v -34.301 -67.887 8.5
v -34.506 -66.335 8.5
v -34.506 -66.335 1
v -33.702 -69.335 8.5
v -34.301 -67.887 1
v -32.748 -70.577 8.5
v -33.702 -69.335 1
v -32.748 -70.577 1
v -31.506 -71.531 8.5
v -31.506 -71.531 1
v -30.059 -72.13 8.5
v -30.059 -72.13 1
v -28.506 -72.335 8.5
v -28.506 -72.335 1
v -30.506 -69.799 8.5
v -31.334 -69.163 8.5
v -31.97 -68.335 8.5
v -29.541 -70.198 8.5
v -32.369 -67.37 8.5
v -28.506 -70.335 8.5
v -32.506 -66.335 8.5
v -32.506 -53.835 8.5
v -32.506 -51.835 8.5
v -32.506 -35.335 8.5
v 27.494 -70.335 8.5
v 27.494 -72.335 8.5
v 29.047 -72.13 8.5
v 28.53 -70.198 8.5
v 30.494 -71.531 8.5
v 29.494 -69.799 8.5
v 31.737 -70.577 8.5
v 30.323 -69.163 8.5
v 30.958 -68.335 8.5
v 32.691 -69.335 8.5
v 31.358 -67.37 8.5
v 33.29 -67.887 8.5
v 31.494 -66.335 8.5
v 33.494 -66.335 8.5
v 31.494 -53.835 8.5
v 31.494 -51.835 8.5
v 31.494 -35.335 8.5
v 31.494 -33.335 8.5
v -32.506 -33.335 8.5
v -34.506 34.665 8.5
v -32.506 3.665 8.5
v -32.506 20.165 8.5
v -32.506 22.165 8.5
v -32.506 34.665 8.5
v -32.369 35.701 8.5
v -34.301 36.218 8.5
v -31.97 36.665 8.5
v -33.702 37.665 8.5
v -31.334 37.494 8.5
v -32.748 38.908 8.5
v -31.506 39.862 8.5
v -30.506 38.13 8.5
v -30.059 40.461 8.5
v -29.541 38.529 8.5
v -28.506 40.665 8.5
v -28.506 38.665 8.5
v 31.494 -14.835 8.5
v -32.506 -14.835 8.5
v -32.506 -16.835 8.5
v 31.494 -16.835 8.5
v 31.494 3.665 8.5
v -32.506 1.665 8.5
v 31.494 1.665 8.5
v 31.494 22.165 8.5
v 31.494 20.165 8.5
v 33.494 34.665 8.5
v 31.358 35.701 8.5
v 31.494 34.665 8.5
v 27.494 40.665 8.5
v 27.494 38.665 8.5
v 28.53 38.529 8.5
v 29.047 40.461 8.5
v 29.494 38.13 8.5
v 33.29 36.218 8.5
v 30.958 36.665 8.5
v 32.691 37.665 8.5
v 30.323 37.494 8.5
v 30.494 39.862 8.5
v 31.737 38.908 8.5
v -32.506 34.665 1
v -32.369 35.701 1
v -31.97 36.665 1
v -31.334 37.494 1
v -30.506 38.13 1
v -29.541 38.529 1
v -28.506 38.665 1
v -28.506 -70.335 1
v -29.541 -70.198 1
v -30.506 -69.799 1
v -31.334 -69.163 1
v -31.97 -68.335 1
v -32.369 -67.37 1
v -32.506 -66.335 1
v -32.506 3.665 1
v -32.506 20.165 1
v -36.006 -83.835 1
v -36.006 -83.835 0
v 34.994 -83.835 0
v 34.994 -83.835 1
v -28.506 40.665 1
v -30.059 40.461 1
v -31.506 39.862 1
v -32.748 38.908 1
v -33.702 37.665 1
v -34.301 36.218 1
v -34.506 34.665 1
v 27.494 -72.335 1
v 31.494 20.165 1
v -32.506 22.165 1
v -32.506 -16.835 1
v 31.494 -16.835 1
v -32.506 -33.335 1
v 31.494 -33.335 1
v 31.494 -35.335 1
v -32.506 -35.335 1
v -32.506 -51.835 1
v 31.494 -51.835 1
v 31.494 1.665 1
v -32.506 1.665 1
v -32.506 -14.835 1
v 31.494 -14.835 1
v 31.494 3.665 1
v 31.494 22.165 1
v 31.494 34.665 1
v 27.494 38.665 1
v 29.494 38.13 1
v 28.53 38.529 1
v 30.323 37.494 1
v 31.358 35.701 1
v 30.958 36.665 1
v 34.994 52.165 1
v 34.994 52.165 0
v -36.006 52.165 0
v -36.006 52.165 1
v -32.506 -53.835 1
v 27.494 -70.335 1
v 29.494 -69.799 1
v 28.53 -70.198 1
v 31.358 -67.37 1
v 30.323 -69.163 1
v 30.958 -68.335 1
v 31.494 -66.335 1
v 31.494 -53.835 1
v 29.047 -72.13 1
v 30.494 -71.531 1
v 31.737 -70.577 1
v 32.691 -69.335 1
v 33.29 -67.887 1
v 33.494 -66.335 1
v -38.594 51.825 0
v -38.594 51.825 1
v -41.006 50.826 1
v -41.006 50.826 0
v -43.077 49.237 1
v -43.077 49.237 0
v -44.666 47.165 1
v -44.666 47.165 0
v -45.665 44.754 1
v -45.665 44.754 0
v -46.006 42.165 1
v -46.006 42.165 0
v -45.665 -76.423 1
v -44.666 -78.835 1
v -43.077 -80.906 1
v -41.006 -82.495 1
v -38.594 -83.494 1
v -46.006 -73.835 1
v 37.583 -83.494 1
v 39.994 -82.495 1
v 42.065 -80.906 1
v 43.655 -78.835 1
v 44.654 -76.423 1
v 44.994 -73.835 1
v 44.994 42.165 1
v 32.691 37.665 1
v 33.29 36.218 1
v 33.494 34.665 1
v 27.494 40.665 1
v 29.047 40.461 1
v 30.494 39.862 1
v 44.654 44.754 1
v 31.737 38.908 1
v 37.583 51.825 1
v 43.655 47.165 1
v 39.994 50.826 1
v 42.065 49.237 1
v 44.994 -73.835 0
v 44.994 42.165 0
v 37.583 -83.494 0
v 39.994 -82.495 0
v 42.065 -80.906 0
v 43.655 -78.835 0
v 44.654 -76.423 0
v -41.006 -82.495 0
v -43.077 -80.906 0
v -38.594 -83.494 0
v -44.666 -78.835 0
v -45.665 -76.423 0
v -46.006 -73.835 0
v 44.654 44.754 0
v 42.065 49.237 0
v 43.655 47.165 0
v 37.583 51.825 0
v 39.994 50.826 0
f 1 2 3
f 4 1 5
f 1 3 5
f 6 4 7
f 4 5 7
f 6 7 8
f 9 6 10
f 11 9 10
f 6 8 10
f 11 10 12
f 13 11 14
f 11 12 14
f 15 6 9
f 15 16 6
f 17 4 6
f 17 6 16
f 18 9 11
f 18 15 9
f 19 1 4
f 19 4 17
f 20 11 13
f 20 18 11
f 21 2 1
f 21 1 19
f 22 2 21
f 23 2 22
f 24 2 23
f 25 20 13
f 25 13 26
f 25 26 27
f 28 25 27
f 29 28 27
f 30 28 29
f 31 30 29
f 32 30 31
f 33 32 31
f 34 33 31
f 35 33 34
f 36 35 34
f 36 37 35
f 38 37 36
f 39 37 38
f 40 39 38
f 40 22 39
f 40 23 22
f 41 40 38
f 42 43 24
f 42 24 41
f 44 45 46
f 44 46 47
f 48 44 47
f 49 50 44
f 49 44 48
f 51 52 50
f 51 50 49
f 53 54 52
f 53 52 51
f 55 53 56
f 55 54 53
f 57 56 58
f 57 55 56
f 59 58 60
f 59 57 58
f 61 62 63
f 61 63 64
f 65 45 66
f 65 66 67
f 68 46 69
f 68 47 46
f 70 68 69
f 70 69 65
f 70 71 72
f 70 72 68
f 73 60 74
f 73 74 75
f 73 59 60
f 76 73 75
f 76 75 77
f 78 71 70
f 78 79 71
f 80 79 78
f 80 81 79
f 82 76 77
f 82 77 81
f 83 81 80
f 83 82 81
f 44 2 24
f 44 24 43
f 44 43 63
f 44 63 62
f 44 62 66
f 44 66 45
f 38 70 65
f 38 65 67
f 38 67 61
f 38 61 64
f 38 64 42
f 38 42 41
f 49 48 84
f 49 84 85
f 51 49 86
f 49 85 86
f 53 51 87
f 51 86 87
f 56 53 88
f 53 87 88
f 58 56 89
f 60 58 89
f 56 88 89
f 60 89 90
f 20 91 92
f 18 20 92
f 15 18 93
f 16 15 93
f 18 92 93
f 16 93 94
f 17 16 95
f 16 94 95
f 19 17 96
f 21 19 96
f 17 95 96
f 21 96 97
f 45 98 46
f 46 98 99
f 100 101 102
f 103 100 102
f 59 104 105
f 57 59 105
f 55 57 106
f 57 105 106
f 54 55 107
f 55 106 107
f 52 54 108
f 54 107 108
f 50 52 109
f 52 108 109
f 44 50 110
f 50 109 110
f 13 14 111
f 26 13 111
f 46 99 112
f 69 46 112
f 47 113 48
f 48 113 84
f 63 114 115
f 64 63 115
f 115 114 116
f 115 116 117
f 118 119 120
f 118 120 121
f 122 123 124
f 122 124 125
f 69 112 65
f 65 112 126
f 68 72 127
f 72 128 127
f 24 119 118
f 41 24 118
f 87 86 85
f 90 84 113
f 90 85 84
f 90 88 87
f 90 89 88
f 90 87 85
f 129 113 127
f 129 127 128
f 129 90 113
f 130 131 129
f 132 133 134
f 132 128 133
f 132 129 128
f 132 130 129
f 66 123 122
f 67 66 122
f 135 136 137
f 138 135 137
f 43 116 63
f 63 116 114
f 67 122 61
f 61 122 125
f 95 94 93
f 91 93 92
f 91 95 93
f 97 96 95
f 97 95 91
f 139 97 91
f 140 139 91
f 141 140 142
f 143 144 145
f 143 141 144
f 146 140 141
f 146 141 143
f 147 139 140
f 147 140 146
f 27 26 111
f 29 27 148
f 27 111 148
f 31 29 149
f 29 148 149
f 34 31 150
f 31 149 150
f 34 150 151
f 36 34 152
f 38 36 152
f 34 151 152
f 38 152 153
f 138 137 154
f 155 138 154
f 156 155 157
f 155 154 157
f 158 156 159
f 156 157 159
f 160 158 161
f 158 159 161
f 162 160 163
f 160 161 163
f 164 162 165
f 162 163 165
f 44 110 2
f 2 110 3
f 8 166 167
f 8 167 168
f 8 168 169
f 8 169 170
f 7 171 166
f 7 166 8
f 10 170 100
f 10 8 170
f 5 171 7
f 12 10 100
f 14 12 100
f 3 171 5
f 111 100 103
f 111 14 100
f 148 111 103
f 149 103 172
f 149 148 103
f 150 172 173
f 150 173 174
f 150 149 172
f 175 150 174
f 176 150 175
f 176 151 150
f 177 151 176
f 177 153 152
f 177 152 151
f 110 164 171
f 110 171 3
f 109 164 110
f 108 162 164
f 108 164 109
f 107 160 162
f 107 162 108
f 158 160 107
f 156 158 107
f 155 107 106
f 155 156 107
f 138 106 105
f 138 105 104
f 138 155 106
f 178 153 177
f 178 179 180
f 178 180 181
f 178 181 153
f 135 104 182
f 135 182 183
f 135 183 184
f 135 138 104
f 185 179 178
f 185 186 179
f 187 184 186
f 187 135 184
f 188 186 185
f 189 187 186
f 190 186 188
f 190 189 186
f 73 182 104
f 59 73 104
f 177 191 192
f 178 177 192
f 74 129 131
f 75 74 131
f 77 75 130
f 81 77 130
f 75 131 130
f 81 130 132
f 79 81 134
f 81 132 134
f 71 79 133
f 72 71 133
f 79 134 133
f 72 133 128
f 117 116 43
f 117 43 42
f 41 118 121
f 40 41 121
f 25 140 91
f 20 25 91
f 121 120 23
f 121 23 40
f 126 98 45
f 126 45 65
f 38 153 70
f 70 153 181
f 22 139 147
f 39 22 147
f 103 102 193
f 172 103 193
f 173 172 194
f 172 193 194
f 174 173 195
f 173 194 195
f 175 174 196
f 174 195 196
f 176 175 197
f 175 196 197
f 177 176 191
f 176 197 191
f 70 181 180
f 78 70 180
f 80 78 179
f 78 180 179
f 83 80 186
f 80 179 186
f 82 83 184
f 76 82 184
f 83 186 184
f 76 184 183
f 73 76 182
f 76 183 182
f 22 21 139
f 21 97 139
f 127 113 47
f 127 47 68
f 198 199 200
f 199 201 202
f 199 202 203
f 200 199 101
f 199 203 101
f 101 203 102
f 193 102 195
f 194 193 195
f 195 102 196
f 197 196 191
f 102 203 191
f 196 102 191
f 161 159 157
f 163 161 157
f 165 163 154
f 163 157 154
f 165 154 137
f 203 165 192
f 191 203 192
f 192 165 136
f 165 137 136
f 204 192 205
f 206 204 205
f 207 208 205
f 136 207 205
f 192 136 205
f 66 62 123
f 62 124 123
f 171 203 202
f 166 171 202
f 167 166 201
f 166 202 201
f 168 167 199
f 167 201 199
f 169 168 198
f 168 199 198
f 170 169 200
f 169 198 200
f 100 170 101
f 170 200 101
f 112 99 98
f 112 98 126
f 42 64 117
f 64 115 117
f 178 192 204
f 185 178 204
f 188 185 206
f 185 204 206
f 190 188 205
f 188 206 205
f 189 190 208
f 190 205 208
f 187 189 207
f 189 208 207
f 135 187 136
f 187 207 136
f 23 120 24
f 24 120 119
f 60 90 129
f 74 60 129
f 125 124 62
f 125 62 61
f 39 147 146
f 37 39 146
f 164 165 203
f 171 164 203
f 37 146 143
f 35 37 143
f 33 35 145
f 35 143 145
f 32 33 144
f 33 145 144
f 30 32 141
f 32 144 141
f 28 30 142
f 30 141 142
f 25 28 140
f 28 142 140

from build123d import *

# Parameters (mm, degrees)
F0_W     = 64
F0_H     = 16.5
F1_DEPTH = 1
F2_DEPTH = 8.5
F0_H_2   = 2
F3_DEPTH = 8.5


with BuildPart() as f1:
    # F0 (on Top) → F1 (new body)
    with BuildSketch(Plane.XY):
        with BuildLine():
            Line((34.994369, 52.165454), (-36.005631, 52.165454))
            ThreePointArc((-36.005631, 52.165454), (-43.076699, 49.236522), (-46.005631, 42.165454))
            Line((-46.005631, 42.165454), (-46.005631, -73.834546))
            ThreePointArc((-46.005631, -73.834546), (-43.076699, -80.905614), (-36.005631, -83.834546))
            Line((-36.005631, -83.834546), (34.994369, -83.834546))
            ThreePointArc((34.994369, -83.834546), (42.065437, -80.905614), (44.994369, -73.834546))
            Line((44.994369, -73.834546), (44.994369, 42.165454))
            ThreePointArc((44.994369, 42.165454), (42.065437, 49.236522), (34.994369, 52.165454))
        make_face()
        with BuildLine():
            ThreePointArc((-38.505631, 34.665454), (-35.576699, 41.736522), (-28.505631, 44.665454))
            Line((-28.505631, 44.665454), (27.494369, 44.665454))
            ThreePointArc((27.494369, 44.665454), (34.565437, 41.736522), (37.494369, 34.665454))
            Line((37.494369, 34.665454), (37.494369, -66.334546))
            ThreePointArc((37.494369, -66.334546), (34.565437, -73.405614), (27.494369, -76.334546))
            Line((27.494369, -76.334546), (-28.505631, -76.334546))
            ThreePointArc((-28.505631, -76.334546), (-35.576699, -73.405614), (-38.505631, -66.334546))
            Line((-38.505631, -66.334546), (-38.505631, 34.665454))
        make_face(mode=Mode.SUBTRACT)
        with BuildLine():
            Line((27.494369, 44.665454), (-28.505631, 44.665454))
            ThreePointArc((-28.505631, 44.665454), (-35.576699, 41.736522), (-38.505631, 34.665454))
            Line((-38.505631, 34.665454), (-38.505631, -66.334546))
            ThreePointArc((-38.505631, -66.334546), (-35.576699, -73.405614), (-28.505631, -76.334546))
            Line((-28.505631, -76.334546), (27.494369, -76.334546))
            ThreePointArc((27.494369, -76.334546), (34.565437, -73.405614), (37.494369, -66.334546))
            Line((37.494369, -66.334546), (37.494369, 34.665454))
            ThreePointArc((37.494369, 34.665454), (34.565437, 41.736522), (27.494369, 44.665454))
        make_face()
        with BuildLine():
            ThreePointArc((-36.505631, 34.665454), (-34.162485, 40.322309), (-28.505631, 42.665454))
            Line((-28.505631, 42.665454), (27.494369, 42.665454))
            ThreePointArc((27.494369, 42.665454), (33.151223, 40.322309), (35.494369, 34.665454))
            Line((35.494369, 34.665454), (35.494369, -66.334546))
            ThreePointArc((35.494369, -66.334546), (33.151223, -71.9914), (27.494369, -74.334546))
            Line((27.494369, -74.334546), (-28.505631, -74.334546))
            ThreePointArc((-28.505631, -74.334546), (-34.162485, -71.9914), (-36.505631, -66.334546))
            Line((-36.505631, -66.334546), (-36.505631, 34.665454))
        make_face(mode=Mode.SUBTRACT)
        with BuildLine():
            Line((27.494369, 42.665454), (-28.505631, 42.665454))
            ThreePointArc((-28.505631, 42.665454), (-34.162485, 40.322309), (-36.505631, 34.665454))
            Line((-36.505631, 34.665454), (-36.505631, -66.334546))
            ThreePointArc((-36.505631, -66.334546), (-34.162485, -71.9914), (-28.505631, -74.334546))
            Line((-28.505631, -74.334546), (27.494369, -74.334546))
            ThreePointArc((27.494369, -74.334546), (33.151223, -71.9914), (35.494369, -66.334546))
            Line((35.494369, -66.334546), (35.494369, 34.665454))
            ThreePointArc((35.494369, 34.665454), (33.151223, 40.322309), (27.494369, 42.665454))
        make_face()
        with BuildLine():
            ThreePointArc((-34.505631, 34.665454), (-32.748272, 38.908095), (-28.505631, 40.665454))
            Line((-28.505631, 40.665454), (27.494369, 40.665454))
            ThreePointArc((27.494369, 40.665454), (31.73701, 38.908095), (33.494369, 34.665454))
            Line((33.494369, 34.665454), (33.494369, -66.334546))
            ThreePointArc((33.494369, -66.334546), (31.73701, -70.577186), (27.494369, -72.334546))
            Line((27.494369, -72.334546), (-28.505631, -72.334546))
            ThreePointArc((-28.505631, -72.334546), (-32.748272, -70.577186), (-34.505631, -66.334546))
            Line((-34.505631, -66.334546), (-34.505631, 34.665454))
        make_face(mode=Mode.SUBTRACT)
        with BuildLine():
            Line((27.494369, 40.665454), (-28.505631, 40.665454))
            ThreePointArc((-28.505631, 40.665454), (-32.748272, 38.908095), (-34.505631, 34.665454))
            Line((-34.505631, 34.665454), (-34.505631, -66.334546))
            ThreePointArc((-34.505631, -66.334546), (-32.748272, -70.577186), (-28.505631, -72.334546))
            Line((-28.505631, -72.334546), (27.494369, -72.334546))
            ThreePointArc((27.494369, -72.334546), (31.73701, -70.577186), (33.494369, -66.334546))
            Line((33.494369, -66.334546), (33.494369, 34.665454))
            ThreePointArc((33.494369, 34.665454), (31.73701, 38.908095), (27.494369, 40.665454))
        make_face()
        with BuildLine():
            ThreePointArc((-32.505631, 34.665454), (-31.334058, 37.493881), (-28.505631, 38.665454))
            Line((-28.505631, 38.665454), (27.494369, 38.665454))
            ThreePointArc((27.494369, 38.665454), (30.322796, 37.493881), (31.494369, 34.665454))
            Line((31.494369, 34.665454), (31.494369, 22.165454))
            Line((31.494369, 22.165454), (31.494369, 20.165454))
            Line((31.494369, 20.165454), (31.494369, 3.665454))
            Line((31.494369, 3.665454), (31.494369, 1.665454))
            Line((31.494369, 1.665454), (31.494369, -14.834546))
            Line((31.494369, -14.834546), (31.494369, -16.834546))
            Line((31.494369, -16.834546), (31.494369, -33.334546))
            Line((31.494369, -33.334546), (31.494369, -35.334546))
            Line((31.494369, -35.334546), (31.494369, -51.834546))
            Line((31.494369, -51.834546), (31.494369, -53.834546))
            Line((31.494369, -53.834546), (31.494369, -66.334546))
            ThreePointArc((31.494369, -66.334546), (30.322796, -69.162973), (27.494369, -70.334546))
            Line((27.494369, -70.334546), (-28.505631, -70.334546))
            ThreePointArc((-28.505631, -70.334546), (-31.334058, -69.162973), (-32.505631, -66.334546))
            Line((-32.505631, -66.334546), (-32.505631, -53.834546))
            Line((-32.505631, -53.834546), (-32.505631, -51.834546))
            Line((-32.505631, -51.834546), (-32.505631, -35.334546))
            Line((-32.505631, -35.334546), (-32.505631, -33.334546))
            Line((-32.505631, -33.334546), (-32.505631, -16.834546))
            Line((-32.505631, -16.834546), (-32.505631, -14.834546))
            Line((-32.505631, -14.834546), (-32.505631, 1.665454))
            Line((-32.505631, 1.665454), (-32.505631, 3.665454))
            Line((-32.505631, 3.665454), (-32.505631, 20.165454))
            Line((-32.505631, 20.165454), (-32.505631, 22.165454))
            Line((-32.505631, 22.165454), (-32.505631, 34.665454))
        make_face(mode=Mode.SUBTRACT)
        with BuildLine():
            Line((27.494369, 38.665454), (-28.505631, 38.665454))
            ThreePointArc((-28.505631, 38.665454), (-31.334058, 37.493881), (-32.505631, 34.665454))
            Line((-32.505631, 34.665454), (-32.505631, 22.165454))
            Line((-32.505631, 22.165454), (31.494369, 22.165454))
            Line((31.494369, 22.165454), (31.494369, 34.665454))
            ThreePointArc((31.494369, 34.665454), (30.322796, 37.493881), (27.494369, 38.665454))
        make_face()
        with Locations((-0.505631, 11.915454)):
            Rectangle(F0_W, F0_H)
        with Locations((-0.505631, -6.584546)):
            Rectangle(F0_W, F0_H)
        with Locations((-0.505631, -25.084546)):
            Rectangle(F0_W, F0_H)
        with Locations((-0.505631, -43.584546)):
            Rectangle(F0_W, F0_H)
        with BuildLine():
            Line((31.494369, -53.834546), (-32.505631, -53.834546))
            Line((-32.505631, -53.834546), (-32.505631, -66.334546))
            ThreePointArc((-32.505631, -66.334546), (-31.334058, -69.162973), (-28.505631, -70.334546))
            Line((-28.505631, -70.334546), (27.494369, -70.334546))
            ThreePointArc((27.494369, -70.334546), (30.322796, -69.162973), (31.494369, -66.334546))
            Line((31.494369, -66.334546), (31.494369, -53.834546))
        make_face()
    extrude(amount=F1_DEPTH)



with BuildPart() as f2:
    # F0 (on Top) → F2 (new body)
    with BuildSketch(Plane.XY):
        with BuildLine():
            Line((27.494369, 40.665454), (-28.505631, 40.665454))
            ThreePointArc((-28.505631, 40.665454), (-32.748272, 38.908095), (-34.505631, 34.665454))
            Line((-34.505631, 34.665454), (-34.505631, -66.334546))
            ThreePointArc((-34.505631, -66.334546), (-32.748272, -70.577186), (-28.505631, -72.334546))
            Line((-28.505631, -72.334546), (27.494369, -72.334546))
            ThreePointArc((27.494369, -72.334546), (31.73701, -70.577186), (33.494369, -66.334546))
            Line((33.494369, -66.334546), (33.494369, 34.665454))
            ThreePointArc((33.494369, 34.665454), (31.73701, 38.908095), (27.494369, 40.665454))
        make_face()
        with BuildLine():
            ThreePointArc((-32.505631, 34.665454), (-31.334058, 37.493881), (-28.505631, 38.665454))
            Line((-28.505631, 38.665454), (27.494369, 38.665454))
            ThreePointArc((27.494369, 38.665454), (30.322796, 37.493881), (31.494369, 34.665454))
            Line((31.494369, 34.665454), (31.494369, 22.165454))
            Line((31.494369, 22.165454), (31.494369, 20.165454))
            Line((31.494369, 20.165454), (31.494369, 3.665454))
            Line((31.494369, 3.665454), (31.494369, 1.665454))
            Line((31.494369, 1.665454), (31.494369, -14.834546))
            Line((31.494369, -14.834546), (31.494369, -16.834546))
            Line((31.494369, -16.834546), (31.494369, -33.334546))
            Line((31.494369, -33.334546), (31.494369, -35.334546))
            Line((31.494369, -35.334546), (31.494369, -51.834546))
            Line((31.494369, -51.834546), (31.494369, -53.834546))
            Line((31.494369, -53.834546), (31.494369, -66.334546))
            ThreePointArc((31.494369, -66.334546), (30.322796, -69.162973), (27.494369, -70.334546))
            Line((27.494369, -70.334546), (-28.505631, -70.334546))
            ThreePointArc((-28.505631, -70.334546), (-31.334058, -69.162973), (-32.505631, -66.334546))
            Line((-32.505631, -66.334546), (-32.505631, -53.834546))
            Line((-32.505631, -53.834546), (-32.505631, -51.834546))
            Line((-32.505631, -51.834546), (-32.505631, -35.334546))
            Line((-32.505631, -35.334546), (-32.505631, -33.334546))
            Line((-32.505631, -33.334546), (-32.505631, -16.834546))
            Line((-32.505631, -16.834546), (-32.505631, -14.834546))
            Line((-32.505631, -14.834546), (-32.505631, 1.665454))
            Line((-32.505631, 1.665454), (-32.505631, 3.665454))
            Line((-32.505631, 3.665454), (-32.505631, 20.165454))
            Line((-32.505631, 20.165454), (-32.505631, 22.165454))
            Line((-32.505631, 22.165454), (-32.505631, 34.665454))
        make_face(mode=Mode.SUBTRACT)
    extrude(amount=F2_DEPTH)


with BuildPart() as f1_1:
    add(f1.part)

    add(f2.part)  # F3 merges F2
    # F0 (on Top) → F3 (join)
    with BuildSketch(Plane.XY):
        with Locations((-0.505631, 21.165454)):
            Rectangle(F0_W, F0_H_2)
        with Locations((-0.505631, 2.665454)):
            Rectangle(F0_W, F0_H_2)
        with Locations((-0.505631, -15.834546)):
            Rectangle(F0_W, F0_H_2)
        with Locations((-0.505631, -34.334546)):
            Rectangle(F0_W, F0_H_2)
        with Locations((-0.505631, -52.834546)):
            Rectangle(F0_W, F0_H_2)
    extrude(amount=F3_DEPTH)


solid = f1_1.part
